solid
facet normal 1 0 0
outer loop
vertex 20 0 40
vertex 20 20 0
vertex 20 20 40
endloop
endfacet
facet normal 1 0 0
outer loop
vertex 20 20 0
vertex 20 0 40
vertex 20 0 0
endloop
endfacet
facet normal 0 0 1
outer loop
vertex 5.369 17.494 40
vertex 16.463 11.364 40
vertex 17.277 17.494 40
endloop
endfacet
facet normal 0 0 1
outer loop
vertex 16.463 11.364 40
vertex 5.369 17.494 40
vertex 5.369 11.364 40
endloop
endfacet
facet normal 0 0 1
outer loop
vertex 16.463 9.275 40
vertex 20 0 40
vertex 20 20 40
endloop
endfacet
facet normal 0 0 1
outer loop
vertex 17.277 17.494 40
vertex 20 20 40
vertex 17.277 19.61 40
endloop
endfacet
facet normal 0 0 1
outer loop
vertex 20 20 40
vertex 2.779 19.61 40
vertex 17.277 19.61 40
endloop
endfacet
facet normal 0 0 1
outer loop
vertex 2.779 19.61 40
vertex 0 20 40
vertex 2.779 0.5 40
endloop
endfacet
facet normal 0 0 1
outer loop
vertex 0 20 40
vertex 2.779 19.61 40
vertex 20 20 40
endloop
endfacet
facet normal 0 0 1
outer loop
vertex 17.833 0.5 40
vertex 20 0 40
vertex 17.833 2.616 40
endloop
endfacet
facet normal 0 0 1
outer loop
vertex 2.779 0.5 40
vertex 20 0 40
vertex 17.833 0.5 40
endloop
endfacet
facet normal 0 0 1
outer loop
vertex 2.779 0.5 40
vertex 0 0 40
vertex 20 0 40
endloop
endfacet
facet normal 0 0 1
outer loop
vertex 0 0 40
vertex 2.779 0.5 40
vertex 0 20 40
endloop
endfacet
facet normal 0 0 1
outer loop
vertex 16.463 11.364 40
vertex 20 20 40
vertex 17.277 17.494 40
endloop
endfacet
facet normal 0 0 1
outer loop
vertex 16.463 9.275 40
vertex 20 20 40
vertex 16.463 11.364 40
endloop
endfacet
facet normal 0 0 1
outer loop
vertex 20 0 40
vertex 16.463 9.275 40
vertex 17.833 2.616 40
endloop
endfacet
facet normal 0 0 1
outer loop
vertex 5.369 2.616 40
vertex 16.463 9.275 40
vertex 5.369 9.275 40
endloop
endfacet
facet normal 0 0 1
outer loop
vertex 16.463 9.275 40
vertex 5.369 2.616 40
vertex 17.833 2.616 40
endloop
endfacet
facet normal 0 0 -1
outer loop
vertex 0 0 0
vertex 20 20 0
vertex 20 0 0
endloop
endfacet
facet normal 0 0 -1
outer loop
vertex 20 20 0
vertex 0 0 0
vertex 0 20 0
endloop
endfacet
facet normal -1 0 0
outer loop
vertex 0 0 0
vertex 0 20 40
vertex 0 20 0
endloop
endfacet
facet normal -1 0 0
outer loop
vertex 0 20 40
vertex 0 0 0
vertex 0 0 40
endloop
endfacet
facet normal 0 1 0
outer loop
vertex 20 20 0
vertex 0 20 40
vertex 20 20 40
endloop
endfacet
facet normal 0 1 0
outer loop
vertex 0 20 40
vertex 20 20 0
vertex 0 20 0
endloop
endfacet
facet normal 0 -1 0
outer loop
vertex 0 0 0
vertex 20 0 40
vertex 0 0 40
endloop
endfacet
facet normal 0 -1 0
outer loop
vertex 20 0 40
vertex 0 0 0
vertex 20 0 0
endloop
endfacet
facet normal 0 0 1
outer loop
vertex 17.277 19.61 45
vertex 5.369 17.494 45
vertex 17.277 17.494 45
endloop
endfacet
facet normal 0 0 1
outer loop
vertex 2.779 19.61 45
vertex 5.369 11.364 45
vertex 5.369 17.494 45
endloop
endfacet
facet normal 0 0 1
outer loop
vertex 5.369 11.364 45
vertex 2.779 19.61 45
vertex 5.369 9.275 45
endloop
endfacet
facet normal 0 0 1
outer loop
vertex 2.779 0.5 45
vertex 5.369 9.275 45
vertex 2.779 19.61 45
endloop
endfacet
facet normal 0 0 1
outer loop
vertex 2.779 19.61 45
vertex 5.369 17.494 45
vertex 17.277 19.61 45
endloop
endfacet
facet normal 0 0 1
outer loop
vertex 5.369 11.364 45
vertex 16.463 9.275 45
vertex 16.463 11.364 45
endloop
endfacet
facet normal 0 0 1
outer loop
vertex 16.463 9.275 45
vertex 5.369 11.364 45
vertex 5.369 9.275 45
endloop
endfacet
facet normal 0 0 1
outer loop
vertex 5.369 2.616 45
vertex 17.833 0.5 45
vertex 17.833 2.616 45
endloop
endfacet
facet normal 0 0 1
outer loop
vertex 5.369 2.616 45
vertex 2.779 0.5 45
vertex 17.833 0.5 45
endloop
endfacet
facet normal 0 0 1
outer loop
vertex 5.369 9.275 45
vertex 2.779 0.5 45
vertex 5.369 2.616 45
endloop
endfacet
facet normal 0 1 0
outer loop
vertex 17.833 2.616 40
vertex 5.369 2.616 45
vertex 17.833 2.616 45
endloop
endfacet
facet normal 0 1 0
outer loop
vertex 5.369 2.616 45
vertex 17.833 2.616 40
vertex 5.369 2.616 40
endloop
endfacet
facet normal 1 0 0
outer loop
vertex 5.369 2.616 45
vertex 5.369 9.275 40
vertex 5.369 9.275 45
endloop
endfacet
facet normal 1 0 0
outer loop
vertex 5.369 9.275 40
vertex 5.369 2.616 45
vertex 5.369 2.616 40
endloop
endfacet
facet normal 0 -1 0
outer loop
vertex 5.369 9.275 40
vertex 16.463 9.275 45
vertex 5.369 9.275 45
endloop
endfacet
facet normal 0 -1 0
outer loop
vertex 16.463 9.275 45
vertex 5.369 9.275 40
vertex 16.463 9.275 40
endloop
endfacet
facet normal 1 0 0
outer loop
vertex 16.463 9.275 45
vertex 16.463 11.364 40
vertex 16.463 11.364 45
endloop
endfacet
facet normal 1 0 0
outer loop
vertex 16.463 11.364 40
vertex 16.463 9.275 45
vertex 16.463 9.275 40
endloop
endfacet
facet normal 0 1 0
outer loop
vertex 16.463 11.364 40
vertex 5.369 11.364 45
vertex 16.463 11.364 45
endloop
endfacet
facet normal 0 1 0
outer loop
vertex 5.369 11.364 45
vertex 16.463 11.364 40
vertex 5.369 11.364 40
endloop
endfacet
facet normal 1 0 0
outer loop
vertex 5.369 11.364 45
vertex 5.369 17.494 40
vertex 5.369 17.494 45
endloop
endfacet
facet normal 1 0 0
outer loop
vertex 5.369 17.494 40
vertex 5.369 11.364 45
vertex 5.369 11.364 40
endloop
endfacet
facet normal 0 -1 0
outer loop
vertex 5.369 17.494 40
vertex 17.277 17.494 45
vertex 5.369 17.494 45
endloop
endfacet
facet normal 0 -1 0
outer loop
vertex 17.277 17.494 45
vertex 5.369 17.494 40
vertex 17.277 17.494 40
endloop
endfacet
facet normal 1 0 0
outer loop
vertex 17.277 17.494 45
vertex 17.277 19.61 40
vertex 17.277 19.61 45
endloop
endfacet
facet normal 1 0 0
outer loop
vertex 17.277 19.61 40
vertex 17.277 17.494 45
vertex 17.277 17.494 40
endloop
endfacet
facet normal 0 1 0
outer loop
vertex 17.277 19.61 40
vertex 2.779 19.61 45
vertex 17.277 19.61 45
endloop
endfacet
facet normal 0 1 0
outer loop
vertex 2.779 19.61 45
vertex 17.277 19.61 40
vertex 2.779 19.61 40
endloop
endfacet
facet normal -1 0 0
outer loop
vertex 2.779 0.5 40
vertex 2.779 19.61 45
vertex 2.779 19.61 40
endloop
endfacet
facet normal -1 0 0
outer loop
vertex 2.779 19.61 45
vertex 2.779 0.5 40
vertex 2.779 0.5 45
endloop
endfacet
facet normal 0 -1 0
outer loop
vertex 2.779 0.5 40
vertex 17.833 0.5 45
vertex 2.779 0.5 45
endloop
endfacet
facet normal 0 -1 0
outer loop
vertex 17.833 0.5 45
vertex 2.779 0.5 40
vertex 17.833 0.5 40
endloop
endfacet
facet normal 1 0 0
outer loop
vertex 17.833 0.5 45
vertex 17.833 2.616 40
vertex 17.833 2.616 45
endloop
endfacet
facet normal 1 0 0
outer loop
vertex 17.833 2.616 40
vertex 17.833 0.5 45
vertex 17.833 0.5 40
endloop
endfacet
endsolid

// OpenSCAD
cube([20, 20, 40]);
translate([0.5, 0.5, 40]){
    linear_extrude(5){
        text("E", size=20);
    }
}
